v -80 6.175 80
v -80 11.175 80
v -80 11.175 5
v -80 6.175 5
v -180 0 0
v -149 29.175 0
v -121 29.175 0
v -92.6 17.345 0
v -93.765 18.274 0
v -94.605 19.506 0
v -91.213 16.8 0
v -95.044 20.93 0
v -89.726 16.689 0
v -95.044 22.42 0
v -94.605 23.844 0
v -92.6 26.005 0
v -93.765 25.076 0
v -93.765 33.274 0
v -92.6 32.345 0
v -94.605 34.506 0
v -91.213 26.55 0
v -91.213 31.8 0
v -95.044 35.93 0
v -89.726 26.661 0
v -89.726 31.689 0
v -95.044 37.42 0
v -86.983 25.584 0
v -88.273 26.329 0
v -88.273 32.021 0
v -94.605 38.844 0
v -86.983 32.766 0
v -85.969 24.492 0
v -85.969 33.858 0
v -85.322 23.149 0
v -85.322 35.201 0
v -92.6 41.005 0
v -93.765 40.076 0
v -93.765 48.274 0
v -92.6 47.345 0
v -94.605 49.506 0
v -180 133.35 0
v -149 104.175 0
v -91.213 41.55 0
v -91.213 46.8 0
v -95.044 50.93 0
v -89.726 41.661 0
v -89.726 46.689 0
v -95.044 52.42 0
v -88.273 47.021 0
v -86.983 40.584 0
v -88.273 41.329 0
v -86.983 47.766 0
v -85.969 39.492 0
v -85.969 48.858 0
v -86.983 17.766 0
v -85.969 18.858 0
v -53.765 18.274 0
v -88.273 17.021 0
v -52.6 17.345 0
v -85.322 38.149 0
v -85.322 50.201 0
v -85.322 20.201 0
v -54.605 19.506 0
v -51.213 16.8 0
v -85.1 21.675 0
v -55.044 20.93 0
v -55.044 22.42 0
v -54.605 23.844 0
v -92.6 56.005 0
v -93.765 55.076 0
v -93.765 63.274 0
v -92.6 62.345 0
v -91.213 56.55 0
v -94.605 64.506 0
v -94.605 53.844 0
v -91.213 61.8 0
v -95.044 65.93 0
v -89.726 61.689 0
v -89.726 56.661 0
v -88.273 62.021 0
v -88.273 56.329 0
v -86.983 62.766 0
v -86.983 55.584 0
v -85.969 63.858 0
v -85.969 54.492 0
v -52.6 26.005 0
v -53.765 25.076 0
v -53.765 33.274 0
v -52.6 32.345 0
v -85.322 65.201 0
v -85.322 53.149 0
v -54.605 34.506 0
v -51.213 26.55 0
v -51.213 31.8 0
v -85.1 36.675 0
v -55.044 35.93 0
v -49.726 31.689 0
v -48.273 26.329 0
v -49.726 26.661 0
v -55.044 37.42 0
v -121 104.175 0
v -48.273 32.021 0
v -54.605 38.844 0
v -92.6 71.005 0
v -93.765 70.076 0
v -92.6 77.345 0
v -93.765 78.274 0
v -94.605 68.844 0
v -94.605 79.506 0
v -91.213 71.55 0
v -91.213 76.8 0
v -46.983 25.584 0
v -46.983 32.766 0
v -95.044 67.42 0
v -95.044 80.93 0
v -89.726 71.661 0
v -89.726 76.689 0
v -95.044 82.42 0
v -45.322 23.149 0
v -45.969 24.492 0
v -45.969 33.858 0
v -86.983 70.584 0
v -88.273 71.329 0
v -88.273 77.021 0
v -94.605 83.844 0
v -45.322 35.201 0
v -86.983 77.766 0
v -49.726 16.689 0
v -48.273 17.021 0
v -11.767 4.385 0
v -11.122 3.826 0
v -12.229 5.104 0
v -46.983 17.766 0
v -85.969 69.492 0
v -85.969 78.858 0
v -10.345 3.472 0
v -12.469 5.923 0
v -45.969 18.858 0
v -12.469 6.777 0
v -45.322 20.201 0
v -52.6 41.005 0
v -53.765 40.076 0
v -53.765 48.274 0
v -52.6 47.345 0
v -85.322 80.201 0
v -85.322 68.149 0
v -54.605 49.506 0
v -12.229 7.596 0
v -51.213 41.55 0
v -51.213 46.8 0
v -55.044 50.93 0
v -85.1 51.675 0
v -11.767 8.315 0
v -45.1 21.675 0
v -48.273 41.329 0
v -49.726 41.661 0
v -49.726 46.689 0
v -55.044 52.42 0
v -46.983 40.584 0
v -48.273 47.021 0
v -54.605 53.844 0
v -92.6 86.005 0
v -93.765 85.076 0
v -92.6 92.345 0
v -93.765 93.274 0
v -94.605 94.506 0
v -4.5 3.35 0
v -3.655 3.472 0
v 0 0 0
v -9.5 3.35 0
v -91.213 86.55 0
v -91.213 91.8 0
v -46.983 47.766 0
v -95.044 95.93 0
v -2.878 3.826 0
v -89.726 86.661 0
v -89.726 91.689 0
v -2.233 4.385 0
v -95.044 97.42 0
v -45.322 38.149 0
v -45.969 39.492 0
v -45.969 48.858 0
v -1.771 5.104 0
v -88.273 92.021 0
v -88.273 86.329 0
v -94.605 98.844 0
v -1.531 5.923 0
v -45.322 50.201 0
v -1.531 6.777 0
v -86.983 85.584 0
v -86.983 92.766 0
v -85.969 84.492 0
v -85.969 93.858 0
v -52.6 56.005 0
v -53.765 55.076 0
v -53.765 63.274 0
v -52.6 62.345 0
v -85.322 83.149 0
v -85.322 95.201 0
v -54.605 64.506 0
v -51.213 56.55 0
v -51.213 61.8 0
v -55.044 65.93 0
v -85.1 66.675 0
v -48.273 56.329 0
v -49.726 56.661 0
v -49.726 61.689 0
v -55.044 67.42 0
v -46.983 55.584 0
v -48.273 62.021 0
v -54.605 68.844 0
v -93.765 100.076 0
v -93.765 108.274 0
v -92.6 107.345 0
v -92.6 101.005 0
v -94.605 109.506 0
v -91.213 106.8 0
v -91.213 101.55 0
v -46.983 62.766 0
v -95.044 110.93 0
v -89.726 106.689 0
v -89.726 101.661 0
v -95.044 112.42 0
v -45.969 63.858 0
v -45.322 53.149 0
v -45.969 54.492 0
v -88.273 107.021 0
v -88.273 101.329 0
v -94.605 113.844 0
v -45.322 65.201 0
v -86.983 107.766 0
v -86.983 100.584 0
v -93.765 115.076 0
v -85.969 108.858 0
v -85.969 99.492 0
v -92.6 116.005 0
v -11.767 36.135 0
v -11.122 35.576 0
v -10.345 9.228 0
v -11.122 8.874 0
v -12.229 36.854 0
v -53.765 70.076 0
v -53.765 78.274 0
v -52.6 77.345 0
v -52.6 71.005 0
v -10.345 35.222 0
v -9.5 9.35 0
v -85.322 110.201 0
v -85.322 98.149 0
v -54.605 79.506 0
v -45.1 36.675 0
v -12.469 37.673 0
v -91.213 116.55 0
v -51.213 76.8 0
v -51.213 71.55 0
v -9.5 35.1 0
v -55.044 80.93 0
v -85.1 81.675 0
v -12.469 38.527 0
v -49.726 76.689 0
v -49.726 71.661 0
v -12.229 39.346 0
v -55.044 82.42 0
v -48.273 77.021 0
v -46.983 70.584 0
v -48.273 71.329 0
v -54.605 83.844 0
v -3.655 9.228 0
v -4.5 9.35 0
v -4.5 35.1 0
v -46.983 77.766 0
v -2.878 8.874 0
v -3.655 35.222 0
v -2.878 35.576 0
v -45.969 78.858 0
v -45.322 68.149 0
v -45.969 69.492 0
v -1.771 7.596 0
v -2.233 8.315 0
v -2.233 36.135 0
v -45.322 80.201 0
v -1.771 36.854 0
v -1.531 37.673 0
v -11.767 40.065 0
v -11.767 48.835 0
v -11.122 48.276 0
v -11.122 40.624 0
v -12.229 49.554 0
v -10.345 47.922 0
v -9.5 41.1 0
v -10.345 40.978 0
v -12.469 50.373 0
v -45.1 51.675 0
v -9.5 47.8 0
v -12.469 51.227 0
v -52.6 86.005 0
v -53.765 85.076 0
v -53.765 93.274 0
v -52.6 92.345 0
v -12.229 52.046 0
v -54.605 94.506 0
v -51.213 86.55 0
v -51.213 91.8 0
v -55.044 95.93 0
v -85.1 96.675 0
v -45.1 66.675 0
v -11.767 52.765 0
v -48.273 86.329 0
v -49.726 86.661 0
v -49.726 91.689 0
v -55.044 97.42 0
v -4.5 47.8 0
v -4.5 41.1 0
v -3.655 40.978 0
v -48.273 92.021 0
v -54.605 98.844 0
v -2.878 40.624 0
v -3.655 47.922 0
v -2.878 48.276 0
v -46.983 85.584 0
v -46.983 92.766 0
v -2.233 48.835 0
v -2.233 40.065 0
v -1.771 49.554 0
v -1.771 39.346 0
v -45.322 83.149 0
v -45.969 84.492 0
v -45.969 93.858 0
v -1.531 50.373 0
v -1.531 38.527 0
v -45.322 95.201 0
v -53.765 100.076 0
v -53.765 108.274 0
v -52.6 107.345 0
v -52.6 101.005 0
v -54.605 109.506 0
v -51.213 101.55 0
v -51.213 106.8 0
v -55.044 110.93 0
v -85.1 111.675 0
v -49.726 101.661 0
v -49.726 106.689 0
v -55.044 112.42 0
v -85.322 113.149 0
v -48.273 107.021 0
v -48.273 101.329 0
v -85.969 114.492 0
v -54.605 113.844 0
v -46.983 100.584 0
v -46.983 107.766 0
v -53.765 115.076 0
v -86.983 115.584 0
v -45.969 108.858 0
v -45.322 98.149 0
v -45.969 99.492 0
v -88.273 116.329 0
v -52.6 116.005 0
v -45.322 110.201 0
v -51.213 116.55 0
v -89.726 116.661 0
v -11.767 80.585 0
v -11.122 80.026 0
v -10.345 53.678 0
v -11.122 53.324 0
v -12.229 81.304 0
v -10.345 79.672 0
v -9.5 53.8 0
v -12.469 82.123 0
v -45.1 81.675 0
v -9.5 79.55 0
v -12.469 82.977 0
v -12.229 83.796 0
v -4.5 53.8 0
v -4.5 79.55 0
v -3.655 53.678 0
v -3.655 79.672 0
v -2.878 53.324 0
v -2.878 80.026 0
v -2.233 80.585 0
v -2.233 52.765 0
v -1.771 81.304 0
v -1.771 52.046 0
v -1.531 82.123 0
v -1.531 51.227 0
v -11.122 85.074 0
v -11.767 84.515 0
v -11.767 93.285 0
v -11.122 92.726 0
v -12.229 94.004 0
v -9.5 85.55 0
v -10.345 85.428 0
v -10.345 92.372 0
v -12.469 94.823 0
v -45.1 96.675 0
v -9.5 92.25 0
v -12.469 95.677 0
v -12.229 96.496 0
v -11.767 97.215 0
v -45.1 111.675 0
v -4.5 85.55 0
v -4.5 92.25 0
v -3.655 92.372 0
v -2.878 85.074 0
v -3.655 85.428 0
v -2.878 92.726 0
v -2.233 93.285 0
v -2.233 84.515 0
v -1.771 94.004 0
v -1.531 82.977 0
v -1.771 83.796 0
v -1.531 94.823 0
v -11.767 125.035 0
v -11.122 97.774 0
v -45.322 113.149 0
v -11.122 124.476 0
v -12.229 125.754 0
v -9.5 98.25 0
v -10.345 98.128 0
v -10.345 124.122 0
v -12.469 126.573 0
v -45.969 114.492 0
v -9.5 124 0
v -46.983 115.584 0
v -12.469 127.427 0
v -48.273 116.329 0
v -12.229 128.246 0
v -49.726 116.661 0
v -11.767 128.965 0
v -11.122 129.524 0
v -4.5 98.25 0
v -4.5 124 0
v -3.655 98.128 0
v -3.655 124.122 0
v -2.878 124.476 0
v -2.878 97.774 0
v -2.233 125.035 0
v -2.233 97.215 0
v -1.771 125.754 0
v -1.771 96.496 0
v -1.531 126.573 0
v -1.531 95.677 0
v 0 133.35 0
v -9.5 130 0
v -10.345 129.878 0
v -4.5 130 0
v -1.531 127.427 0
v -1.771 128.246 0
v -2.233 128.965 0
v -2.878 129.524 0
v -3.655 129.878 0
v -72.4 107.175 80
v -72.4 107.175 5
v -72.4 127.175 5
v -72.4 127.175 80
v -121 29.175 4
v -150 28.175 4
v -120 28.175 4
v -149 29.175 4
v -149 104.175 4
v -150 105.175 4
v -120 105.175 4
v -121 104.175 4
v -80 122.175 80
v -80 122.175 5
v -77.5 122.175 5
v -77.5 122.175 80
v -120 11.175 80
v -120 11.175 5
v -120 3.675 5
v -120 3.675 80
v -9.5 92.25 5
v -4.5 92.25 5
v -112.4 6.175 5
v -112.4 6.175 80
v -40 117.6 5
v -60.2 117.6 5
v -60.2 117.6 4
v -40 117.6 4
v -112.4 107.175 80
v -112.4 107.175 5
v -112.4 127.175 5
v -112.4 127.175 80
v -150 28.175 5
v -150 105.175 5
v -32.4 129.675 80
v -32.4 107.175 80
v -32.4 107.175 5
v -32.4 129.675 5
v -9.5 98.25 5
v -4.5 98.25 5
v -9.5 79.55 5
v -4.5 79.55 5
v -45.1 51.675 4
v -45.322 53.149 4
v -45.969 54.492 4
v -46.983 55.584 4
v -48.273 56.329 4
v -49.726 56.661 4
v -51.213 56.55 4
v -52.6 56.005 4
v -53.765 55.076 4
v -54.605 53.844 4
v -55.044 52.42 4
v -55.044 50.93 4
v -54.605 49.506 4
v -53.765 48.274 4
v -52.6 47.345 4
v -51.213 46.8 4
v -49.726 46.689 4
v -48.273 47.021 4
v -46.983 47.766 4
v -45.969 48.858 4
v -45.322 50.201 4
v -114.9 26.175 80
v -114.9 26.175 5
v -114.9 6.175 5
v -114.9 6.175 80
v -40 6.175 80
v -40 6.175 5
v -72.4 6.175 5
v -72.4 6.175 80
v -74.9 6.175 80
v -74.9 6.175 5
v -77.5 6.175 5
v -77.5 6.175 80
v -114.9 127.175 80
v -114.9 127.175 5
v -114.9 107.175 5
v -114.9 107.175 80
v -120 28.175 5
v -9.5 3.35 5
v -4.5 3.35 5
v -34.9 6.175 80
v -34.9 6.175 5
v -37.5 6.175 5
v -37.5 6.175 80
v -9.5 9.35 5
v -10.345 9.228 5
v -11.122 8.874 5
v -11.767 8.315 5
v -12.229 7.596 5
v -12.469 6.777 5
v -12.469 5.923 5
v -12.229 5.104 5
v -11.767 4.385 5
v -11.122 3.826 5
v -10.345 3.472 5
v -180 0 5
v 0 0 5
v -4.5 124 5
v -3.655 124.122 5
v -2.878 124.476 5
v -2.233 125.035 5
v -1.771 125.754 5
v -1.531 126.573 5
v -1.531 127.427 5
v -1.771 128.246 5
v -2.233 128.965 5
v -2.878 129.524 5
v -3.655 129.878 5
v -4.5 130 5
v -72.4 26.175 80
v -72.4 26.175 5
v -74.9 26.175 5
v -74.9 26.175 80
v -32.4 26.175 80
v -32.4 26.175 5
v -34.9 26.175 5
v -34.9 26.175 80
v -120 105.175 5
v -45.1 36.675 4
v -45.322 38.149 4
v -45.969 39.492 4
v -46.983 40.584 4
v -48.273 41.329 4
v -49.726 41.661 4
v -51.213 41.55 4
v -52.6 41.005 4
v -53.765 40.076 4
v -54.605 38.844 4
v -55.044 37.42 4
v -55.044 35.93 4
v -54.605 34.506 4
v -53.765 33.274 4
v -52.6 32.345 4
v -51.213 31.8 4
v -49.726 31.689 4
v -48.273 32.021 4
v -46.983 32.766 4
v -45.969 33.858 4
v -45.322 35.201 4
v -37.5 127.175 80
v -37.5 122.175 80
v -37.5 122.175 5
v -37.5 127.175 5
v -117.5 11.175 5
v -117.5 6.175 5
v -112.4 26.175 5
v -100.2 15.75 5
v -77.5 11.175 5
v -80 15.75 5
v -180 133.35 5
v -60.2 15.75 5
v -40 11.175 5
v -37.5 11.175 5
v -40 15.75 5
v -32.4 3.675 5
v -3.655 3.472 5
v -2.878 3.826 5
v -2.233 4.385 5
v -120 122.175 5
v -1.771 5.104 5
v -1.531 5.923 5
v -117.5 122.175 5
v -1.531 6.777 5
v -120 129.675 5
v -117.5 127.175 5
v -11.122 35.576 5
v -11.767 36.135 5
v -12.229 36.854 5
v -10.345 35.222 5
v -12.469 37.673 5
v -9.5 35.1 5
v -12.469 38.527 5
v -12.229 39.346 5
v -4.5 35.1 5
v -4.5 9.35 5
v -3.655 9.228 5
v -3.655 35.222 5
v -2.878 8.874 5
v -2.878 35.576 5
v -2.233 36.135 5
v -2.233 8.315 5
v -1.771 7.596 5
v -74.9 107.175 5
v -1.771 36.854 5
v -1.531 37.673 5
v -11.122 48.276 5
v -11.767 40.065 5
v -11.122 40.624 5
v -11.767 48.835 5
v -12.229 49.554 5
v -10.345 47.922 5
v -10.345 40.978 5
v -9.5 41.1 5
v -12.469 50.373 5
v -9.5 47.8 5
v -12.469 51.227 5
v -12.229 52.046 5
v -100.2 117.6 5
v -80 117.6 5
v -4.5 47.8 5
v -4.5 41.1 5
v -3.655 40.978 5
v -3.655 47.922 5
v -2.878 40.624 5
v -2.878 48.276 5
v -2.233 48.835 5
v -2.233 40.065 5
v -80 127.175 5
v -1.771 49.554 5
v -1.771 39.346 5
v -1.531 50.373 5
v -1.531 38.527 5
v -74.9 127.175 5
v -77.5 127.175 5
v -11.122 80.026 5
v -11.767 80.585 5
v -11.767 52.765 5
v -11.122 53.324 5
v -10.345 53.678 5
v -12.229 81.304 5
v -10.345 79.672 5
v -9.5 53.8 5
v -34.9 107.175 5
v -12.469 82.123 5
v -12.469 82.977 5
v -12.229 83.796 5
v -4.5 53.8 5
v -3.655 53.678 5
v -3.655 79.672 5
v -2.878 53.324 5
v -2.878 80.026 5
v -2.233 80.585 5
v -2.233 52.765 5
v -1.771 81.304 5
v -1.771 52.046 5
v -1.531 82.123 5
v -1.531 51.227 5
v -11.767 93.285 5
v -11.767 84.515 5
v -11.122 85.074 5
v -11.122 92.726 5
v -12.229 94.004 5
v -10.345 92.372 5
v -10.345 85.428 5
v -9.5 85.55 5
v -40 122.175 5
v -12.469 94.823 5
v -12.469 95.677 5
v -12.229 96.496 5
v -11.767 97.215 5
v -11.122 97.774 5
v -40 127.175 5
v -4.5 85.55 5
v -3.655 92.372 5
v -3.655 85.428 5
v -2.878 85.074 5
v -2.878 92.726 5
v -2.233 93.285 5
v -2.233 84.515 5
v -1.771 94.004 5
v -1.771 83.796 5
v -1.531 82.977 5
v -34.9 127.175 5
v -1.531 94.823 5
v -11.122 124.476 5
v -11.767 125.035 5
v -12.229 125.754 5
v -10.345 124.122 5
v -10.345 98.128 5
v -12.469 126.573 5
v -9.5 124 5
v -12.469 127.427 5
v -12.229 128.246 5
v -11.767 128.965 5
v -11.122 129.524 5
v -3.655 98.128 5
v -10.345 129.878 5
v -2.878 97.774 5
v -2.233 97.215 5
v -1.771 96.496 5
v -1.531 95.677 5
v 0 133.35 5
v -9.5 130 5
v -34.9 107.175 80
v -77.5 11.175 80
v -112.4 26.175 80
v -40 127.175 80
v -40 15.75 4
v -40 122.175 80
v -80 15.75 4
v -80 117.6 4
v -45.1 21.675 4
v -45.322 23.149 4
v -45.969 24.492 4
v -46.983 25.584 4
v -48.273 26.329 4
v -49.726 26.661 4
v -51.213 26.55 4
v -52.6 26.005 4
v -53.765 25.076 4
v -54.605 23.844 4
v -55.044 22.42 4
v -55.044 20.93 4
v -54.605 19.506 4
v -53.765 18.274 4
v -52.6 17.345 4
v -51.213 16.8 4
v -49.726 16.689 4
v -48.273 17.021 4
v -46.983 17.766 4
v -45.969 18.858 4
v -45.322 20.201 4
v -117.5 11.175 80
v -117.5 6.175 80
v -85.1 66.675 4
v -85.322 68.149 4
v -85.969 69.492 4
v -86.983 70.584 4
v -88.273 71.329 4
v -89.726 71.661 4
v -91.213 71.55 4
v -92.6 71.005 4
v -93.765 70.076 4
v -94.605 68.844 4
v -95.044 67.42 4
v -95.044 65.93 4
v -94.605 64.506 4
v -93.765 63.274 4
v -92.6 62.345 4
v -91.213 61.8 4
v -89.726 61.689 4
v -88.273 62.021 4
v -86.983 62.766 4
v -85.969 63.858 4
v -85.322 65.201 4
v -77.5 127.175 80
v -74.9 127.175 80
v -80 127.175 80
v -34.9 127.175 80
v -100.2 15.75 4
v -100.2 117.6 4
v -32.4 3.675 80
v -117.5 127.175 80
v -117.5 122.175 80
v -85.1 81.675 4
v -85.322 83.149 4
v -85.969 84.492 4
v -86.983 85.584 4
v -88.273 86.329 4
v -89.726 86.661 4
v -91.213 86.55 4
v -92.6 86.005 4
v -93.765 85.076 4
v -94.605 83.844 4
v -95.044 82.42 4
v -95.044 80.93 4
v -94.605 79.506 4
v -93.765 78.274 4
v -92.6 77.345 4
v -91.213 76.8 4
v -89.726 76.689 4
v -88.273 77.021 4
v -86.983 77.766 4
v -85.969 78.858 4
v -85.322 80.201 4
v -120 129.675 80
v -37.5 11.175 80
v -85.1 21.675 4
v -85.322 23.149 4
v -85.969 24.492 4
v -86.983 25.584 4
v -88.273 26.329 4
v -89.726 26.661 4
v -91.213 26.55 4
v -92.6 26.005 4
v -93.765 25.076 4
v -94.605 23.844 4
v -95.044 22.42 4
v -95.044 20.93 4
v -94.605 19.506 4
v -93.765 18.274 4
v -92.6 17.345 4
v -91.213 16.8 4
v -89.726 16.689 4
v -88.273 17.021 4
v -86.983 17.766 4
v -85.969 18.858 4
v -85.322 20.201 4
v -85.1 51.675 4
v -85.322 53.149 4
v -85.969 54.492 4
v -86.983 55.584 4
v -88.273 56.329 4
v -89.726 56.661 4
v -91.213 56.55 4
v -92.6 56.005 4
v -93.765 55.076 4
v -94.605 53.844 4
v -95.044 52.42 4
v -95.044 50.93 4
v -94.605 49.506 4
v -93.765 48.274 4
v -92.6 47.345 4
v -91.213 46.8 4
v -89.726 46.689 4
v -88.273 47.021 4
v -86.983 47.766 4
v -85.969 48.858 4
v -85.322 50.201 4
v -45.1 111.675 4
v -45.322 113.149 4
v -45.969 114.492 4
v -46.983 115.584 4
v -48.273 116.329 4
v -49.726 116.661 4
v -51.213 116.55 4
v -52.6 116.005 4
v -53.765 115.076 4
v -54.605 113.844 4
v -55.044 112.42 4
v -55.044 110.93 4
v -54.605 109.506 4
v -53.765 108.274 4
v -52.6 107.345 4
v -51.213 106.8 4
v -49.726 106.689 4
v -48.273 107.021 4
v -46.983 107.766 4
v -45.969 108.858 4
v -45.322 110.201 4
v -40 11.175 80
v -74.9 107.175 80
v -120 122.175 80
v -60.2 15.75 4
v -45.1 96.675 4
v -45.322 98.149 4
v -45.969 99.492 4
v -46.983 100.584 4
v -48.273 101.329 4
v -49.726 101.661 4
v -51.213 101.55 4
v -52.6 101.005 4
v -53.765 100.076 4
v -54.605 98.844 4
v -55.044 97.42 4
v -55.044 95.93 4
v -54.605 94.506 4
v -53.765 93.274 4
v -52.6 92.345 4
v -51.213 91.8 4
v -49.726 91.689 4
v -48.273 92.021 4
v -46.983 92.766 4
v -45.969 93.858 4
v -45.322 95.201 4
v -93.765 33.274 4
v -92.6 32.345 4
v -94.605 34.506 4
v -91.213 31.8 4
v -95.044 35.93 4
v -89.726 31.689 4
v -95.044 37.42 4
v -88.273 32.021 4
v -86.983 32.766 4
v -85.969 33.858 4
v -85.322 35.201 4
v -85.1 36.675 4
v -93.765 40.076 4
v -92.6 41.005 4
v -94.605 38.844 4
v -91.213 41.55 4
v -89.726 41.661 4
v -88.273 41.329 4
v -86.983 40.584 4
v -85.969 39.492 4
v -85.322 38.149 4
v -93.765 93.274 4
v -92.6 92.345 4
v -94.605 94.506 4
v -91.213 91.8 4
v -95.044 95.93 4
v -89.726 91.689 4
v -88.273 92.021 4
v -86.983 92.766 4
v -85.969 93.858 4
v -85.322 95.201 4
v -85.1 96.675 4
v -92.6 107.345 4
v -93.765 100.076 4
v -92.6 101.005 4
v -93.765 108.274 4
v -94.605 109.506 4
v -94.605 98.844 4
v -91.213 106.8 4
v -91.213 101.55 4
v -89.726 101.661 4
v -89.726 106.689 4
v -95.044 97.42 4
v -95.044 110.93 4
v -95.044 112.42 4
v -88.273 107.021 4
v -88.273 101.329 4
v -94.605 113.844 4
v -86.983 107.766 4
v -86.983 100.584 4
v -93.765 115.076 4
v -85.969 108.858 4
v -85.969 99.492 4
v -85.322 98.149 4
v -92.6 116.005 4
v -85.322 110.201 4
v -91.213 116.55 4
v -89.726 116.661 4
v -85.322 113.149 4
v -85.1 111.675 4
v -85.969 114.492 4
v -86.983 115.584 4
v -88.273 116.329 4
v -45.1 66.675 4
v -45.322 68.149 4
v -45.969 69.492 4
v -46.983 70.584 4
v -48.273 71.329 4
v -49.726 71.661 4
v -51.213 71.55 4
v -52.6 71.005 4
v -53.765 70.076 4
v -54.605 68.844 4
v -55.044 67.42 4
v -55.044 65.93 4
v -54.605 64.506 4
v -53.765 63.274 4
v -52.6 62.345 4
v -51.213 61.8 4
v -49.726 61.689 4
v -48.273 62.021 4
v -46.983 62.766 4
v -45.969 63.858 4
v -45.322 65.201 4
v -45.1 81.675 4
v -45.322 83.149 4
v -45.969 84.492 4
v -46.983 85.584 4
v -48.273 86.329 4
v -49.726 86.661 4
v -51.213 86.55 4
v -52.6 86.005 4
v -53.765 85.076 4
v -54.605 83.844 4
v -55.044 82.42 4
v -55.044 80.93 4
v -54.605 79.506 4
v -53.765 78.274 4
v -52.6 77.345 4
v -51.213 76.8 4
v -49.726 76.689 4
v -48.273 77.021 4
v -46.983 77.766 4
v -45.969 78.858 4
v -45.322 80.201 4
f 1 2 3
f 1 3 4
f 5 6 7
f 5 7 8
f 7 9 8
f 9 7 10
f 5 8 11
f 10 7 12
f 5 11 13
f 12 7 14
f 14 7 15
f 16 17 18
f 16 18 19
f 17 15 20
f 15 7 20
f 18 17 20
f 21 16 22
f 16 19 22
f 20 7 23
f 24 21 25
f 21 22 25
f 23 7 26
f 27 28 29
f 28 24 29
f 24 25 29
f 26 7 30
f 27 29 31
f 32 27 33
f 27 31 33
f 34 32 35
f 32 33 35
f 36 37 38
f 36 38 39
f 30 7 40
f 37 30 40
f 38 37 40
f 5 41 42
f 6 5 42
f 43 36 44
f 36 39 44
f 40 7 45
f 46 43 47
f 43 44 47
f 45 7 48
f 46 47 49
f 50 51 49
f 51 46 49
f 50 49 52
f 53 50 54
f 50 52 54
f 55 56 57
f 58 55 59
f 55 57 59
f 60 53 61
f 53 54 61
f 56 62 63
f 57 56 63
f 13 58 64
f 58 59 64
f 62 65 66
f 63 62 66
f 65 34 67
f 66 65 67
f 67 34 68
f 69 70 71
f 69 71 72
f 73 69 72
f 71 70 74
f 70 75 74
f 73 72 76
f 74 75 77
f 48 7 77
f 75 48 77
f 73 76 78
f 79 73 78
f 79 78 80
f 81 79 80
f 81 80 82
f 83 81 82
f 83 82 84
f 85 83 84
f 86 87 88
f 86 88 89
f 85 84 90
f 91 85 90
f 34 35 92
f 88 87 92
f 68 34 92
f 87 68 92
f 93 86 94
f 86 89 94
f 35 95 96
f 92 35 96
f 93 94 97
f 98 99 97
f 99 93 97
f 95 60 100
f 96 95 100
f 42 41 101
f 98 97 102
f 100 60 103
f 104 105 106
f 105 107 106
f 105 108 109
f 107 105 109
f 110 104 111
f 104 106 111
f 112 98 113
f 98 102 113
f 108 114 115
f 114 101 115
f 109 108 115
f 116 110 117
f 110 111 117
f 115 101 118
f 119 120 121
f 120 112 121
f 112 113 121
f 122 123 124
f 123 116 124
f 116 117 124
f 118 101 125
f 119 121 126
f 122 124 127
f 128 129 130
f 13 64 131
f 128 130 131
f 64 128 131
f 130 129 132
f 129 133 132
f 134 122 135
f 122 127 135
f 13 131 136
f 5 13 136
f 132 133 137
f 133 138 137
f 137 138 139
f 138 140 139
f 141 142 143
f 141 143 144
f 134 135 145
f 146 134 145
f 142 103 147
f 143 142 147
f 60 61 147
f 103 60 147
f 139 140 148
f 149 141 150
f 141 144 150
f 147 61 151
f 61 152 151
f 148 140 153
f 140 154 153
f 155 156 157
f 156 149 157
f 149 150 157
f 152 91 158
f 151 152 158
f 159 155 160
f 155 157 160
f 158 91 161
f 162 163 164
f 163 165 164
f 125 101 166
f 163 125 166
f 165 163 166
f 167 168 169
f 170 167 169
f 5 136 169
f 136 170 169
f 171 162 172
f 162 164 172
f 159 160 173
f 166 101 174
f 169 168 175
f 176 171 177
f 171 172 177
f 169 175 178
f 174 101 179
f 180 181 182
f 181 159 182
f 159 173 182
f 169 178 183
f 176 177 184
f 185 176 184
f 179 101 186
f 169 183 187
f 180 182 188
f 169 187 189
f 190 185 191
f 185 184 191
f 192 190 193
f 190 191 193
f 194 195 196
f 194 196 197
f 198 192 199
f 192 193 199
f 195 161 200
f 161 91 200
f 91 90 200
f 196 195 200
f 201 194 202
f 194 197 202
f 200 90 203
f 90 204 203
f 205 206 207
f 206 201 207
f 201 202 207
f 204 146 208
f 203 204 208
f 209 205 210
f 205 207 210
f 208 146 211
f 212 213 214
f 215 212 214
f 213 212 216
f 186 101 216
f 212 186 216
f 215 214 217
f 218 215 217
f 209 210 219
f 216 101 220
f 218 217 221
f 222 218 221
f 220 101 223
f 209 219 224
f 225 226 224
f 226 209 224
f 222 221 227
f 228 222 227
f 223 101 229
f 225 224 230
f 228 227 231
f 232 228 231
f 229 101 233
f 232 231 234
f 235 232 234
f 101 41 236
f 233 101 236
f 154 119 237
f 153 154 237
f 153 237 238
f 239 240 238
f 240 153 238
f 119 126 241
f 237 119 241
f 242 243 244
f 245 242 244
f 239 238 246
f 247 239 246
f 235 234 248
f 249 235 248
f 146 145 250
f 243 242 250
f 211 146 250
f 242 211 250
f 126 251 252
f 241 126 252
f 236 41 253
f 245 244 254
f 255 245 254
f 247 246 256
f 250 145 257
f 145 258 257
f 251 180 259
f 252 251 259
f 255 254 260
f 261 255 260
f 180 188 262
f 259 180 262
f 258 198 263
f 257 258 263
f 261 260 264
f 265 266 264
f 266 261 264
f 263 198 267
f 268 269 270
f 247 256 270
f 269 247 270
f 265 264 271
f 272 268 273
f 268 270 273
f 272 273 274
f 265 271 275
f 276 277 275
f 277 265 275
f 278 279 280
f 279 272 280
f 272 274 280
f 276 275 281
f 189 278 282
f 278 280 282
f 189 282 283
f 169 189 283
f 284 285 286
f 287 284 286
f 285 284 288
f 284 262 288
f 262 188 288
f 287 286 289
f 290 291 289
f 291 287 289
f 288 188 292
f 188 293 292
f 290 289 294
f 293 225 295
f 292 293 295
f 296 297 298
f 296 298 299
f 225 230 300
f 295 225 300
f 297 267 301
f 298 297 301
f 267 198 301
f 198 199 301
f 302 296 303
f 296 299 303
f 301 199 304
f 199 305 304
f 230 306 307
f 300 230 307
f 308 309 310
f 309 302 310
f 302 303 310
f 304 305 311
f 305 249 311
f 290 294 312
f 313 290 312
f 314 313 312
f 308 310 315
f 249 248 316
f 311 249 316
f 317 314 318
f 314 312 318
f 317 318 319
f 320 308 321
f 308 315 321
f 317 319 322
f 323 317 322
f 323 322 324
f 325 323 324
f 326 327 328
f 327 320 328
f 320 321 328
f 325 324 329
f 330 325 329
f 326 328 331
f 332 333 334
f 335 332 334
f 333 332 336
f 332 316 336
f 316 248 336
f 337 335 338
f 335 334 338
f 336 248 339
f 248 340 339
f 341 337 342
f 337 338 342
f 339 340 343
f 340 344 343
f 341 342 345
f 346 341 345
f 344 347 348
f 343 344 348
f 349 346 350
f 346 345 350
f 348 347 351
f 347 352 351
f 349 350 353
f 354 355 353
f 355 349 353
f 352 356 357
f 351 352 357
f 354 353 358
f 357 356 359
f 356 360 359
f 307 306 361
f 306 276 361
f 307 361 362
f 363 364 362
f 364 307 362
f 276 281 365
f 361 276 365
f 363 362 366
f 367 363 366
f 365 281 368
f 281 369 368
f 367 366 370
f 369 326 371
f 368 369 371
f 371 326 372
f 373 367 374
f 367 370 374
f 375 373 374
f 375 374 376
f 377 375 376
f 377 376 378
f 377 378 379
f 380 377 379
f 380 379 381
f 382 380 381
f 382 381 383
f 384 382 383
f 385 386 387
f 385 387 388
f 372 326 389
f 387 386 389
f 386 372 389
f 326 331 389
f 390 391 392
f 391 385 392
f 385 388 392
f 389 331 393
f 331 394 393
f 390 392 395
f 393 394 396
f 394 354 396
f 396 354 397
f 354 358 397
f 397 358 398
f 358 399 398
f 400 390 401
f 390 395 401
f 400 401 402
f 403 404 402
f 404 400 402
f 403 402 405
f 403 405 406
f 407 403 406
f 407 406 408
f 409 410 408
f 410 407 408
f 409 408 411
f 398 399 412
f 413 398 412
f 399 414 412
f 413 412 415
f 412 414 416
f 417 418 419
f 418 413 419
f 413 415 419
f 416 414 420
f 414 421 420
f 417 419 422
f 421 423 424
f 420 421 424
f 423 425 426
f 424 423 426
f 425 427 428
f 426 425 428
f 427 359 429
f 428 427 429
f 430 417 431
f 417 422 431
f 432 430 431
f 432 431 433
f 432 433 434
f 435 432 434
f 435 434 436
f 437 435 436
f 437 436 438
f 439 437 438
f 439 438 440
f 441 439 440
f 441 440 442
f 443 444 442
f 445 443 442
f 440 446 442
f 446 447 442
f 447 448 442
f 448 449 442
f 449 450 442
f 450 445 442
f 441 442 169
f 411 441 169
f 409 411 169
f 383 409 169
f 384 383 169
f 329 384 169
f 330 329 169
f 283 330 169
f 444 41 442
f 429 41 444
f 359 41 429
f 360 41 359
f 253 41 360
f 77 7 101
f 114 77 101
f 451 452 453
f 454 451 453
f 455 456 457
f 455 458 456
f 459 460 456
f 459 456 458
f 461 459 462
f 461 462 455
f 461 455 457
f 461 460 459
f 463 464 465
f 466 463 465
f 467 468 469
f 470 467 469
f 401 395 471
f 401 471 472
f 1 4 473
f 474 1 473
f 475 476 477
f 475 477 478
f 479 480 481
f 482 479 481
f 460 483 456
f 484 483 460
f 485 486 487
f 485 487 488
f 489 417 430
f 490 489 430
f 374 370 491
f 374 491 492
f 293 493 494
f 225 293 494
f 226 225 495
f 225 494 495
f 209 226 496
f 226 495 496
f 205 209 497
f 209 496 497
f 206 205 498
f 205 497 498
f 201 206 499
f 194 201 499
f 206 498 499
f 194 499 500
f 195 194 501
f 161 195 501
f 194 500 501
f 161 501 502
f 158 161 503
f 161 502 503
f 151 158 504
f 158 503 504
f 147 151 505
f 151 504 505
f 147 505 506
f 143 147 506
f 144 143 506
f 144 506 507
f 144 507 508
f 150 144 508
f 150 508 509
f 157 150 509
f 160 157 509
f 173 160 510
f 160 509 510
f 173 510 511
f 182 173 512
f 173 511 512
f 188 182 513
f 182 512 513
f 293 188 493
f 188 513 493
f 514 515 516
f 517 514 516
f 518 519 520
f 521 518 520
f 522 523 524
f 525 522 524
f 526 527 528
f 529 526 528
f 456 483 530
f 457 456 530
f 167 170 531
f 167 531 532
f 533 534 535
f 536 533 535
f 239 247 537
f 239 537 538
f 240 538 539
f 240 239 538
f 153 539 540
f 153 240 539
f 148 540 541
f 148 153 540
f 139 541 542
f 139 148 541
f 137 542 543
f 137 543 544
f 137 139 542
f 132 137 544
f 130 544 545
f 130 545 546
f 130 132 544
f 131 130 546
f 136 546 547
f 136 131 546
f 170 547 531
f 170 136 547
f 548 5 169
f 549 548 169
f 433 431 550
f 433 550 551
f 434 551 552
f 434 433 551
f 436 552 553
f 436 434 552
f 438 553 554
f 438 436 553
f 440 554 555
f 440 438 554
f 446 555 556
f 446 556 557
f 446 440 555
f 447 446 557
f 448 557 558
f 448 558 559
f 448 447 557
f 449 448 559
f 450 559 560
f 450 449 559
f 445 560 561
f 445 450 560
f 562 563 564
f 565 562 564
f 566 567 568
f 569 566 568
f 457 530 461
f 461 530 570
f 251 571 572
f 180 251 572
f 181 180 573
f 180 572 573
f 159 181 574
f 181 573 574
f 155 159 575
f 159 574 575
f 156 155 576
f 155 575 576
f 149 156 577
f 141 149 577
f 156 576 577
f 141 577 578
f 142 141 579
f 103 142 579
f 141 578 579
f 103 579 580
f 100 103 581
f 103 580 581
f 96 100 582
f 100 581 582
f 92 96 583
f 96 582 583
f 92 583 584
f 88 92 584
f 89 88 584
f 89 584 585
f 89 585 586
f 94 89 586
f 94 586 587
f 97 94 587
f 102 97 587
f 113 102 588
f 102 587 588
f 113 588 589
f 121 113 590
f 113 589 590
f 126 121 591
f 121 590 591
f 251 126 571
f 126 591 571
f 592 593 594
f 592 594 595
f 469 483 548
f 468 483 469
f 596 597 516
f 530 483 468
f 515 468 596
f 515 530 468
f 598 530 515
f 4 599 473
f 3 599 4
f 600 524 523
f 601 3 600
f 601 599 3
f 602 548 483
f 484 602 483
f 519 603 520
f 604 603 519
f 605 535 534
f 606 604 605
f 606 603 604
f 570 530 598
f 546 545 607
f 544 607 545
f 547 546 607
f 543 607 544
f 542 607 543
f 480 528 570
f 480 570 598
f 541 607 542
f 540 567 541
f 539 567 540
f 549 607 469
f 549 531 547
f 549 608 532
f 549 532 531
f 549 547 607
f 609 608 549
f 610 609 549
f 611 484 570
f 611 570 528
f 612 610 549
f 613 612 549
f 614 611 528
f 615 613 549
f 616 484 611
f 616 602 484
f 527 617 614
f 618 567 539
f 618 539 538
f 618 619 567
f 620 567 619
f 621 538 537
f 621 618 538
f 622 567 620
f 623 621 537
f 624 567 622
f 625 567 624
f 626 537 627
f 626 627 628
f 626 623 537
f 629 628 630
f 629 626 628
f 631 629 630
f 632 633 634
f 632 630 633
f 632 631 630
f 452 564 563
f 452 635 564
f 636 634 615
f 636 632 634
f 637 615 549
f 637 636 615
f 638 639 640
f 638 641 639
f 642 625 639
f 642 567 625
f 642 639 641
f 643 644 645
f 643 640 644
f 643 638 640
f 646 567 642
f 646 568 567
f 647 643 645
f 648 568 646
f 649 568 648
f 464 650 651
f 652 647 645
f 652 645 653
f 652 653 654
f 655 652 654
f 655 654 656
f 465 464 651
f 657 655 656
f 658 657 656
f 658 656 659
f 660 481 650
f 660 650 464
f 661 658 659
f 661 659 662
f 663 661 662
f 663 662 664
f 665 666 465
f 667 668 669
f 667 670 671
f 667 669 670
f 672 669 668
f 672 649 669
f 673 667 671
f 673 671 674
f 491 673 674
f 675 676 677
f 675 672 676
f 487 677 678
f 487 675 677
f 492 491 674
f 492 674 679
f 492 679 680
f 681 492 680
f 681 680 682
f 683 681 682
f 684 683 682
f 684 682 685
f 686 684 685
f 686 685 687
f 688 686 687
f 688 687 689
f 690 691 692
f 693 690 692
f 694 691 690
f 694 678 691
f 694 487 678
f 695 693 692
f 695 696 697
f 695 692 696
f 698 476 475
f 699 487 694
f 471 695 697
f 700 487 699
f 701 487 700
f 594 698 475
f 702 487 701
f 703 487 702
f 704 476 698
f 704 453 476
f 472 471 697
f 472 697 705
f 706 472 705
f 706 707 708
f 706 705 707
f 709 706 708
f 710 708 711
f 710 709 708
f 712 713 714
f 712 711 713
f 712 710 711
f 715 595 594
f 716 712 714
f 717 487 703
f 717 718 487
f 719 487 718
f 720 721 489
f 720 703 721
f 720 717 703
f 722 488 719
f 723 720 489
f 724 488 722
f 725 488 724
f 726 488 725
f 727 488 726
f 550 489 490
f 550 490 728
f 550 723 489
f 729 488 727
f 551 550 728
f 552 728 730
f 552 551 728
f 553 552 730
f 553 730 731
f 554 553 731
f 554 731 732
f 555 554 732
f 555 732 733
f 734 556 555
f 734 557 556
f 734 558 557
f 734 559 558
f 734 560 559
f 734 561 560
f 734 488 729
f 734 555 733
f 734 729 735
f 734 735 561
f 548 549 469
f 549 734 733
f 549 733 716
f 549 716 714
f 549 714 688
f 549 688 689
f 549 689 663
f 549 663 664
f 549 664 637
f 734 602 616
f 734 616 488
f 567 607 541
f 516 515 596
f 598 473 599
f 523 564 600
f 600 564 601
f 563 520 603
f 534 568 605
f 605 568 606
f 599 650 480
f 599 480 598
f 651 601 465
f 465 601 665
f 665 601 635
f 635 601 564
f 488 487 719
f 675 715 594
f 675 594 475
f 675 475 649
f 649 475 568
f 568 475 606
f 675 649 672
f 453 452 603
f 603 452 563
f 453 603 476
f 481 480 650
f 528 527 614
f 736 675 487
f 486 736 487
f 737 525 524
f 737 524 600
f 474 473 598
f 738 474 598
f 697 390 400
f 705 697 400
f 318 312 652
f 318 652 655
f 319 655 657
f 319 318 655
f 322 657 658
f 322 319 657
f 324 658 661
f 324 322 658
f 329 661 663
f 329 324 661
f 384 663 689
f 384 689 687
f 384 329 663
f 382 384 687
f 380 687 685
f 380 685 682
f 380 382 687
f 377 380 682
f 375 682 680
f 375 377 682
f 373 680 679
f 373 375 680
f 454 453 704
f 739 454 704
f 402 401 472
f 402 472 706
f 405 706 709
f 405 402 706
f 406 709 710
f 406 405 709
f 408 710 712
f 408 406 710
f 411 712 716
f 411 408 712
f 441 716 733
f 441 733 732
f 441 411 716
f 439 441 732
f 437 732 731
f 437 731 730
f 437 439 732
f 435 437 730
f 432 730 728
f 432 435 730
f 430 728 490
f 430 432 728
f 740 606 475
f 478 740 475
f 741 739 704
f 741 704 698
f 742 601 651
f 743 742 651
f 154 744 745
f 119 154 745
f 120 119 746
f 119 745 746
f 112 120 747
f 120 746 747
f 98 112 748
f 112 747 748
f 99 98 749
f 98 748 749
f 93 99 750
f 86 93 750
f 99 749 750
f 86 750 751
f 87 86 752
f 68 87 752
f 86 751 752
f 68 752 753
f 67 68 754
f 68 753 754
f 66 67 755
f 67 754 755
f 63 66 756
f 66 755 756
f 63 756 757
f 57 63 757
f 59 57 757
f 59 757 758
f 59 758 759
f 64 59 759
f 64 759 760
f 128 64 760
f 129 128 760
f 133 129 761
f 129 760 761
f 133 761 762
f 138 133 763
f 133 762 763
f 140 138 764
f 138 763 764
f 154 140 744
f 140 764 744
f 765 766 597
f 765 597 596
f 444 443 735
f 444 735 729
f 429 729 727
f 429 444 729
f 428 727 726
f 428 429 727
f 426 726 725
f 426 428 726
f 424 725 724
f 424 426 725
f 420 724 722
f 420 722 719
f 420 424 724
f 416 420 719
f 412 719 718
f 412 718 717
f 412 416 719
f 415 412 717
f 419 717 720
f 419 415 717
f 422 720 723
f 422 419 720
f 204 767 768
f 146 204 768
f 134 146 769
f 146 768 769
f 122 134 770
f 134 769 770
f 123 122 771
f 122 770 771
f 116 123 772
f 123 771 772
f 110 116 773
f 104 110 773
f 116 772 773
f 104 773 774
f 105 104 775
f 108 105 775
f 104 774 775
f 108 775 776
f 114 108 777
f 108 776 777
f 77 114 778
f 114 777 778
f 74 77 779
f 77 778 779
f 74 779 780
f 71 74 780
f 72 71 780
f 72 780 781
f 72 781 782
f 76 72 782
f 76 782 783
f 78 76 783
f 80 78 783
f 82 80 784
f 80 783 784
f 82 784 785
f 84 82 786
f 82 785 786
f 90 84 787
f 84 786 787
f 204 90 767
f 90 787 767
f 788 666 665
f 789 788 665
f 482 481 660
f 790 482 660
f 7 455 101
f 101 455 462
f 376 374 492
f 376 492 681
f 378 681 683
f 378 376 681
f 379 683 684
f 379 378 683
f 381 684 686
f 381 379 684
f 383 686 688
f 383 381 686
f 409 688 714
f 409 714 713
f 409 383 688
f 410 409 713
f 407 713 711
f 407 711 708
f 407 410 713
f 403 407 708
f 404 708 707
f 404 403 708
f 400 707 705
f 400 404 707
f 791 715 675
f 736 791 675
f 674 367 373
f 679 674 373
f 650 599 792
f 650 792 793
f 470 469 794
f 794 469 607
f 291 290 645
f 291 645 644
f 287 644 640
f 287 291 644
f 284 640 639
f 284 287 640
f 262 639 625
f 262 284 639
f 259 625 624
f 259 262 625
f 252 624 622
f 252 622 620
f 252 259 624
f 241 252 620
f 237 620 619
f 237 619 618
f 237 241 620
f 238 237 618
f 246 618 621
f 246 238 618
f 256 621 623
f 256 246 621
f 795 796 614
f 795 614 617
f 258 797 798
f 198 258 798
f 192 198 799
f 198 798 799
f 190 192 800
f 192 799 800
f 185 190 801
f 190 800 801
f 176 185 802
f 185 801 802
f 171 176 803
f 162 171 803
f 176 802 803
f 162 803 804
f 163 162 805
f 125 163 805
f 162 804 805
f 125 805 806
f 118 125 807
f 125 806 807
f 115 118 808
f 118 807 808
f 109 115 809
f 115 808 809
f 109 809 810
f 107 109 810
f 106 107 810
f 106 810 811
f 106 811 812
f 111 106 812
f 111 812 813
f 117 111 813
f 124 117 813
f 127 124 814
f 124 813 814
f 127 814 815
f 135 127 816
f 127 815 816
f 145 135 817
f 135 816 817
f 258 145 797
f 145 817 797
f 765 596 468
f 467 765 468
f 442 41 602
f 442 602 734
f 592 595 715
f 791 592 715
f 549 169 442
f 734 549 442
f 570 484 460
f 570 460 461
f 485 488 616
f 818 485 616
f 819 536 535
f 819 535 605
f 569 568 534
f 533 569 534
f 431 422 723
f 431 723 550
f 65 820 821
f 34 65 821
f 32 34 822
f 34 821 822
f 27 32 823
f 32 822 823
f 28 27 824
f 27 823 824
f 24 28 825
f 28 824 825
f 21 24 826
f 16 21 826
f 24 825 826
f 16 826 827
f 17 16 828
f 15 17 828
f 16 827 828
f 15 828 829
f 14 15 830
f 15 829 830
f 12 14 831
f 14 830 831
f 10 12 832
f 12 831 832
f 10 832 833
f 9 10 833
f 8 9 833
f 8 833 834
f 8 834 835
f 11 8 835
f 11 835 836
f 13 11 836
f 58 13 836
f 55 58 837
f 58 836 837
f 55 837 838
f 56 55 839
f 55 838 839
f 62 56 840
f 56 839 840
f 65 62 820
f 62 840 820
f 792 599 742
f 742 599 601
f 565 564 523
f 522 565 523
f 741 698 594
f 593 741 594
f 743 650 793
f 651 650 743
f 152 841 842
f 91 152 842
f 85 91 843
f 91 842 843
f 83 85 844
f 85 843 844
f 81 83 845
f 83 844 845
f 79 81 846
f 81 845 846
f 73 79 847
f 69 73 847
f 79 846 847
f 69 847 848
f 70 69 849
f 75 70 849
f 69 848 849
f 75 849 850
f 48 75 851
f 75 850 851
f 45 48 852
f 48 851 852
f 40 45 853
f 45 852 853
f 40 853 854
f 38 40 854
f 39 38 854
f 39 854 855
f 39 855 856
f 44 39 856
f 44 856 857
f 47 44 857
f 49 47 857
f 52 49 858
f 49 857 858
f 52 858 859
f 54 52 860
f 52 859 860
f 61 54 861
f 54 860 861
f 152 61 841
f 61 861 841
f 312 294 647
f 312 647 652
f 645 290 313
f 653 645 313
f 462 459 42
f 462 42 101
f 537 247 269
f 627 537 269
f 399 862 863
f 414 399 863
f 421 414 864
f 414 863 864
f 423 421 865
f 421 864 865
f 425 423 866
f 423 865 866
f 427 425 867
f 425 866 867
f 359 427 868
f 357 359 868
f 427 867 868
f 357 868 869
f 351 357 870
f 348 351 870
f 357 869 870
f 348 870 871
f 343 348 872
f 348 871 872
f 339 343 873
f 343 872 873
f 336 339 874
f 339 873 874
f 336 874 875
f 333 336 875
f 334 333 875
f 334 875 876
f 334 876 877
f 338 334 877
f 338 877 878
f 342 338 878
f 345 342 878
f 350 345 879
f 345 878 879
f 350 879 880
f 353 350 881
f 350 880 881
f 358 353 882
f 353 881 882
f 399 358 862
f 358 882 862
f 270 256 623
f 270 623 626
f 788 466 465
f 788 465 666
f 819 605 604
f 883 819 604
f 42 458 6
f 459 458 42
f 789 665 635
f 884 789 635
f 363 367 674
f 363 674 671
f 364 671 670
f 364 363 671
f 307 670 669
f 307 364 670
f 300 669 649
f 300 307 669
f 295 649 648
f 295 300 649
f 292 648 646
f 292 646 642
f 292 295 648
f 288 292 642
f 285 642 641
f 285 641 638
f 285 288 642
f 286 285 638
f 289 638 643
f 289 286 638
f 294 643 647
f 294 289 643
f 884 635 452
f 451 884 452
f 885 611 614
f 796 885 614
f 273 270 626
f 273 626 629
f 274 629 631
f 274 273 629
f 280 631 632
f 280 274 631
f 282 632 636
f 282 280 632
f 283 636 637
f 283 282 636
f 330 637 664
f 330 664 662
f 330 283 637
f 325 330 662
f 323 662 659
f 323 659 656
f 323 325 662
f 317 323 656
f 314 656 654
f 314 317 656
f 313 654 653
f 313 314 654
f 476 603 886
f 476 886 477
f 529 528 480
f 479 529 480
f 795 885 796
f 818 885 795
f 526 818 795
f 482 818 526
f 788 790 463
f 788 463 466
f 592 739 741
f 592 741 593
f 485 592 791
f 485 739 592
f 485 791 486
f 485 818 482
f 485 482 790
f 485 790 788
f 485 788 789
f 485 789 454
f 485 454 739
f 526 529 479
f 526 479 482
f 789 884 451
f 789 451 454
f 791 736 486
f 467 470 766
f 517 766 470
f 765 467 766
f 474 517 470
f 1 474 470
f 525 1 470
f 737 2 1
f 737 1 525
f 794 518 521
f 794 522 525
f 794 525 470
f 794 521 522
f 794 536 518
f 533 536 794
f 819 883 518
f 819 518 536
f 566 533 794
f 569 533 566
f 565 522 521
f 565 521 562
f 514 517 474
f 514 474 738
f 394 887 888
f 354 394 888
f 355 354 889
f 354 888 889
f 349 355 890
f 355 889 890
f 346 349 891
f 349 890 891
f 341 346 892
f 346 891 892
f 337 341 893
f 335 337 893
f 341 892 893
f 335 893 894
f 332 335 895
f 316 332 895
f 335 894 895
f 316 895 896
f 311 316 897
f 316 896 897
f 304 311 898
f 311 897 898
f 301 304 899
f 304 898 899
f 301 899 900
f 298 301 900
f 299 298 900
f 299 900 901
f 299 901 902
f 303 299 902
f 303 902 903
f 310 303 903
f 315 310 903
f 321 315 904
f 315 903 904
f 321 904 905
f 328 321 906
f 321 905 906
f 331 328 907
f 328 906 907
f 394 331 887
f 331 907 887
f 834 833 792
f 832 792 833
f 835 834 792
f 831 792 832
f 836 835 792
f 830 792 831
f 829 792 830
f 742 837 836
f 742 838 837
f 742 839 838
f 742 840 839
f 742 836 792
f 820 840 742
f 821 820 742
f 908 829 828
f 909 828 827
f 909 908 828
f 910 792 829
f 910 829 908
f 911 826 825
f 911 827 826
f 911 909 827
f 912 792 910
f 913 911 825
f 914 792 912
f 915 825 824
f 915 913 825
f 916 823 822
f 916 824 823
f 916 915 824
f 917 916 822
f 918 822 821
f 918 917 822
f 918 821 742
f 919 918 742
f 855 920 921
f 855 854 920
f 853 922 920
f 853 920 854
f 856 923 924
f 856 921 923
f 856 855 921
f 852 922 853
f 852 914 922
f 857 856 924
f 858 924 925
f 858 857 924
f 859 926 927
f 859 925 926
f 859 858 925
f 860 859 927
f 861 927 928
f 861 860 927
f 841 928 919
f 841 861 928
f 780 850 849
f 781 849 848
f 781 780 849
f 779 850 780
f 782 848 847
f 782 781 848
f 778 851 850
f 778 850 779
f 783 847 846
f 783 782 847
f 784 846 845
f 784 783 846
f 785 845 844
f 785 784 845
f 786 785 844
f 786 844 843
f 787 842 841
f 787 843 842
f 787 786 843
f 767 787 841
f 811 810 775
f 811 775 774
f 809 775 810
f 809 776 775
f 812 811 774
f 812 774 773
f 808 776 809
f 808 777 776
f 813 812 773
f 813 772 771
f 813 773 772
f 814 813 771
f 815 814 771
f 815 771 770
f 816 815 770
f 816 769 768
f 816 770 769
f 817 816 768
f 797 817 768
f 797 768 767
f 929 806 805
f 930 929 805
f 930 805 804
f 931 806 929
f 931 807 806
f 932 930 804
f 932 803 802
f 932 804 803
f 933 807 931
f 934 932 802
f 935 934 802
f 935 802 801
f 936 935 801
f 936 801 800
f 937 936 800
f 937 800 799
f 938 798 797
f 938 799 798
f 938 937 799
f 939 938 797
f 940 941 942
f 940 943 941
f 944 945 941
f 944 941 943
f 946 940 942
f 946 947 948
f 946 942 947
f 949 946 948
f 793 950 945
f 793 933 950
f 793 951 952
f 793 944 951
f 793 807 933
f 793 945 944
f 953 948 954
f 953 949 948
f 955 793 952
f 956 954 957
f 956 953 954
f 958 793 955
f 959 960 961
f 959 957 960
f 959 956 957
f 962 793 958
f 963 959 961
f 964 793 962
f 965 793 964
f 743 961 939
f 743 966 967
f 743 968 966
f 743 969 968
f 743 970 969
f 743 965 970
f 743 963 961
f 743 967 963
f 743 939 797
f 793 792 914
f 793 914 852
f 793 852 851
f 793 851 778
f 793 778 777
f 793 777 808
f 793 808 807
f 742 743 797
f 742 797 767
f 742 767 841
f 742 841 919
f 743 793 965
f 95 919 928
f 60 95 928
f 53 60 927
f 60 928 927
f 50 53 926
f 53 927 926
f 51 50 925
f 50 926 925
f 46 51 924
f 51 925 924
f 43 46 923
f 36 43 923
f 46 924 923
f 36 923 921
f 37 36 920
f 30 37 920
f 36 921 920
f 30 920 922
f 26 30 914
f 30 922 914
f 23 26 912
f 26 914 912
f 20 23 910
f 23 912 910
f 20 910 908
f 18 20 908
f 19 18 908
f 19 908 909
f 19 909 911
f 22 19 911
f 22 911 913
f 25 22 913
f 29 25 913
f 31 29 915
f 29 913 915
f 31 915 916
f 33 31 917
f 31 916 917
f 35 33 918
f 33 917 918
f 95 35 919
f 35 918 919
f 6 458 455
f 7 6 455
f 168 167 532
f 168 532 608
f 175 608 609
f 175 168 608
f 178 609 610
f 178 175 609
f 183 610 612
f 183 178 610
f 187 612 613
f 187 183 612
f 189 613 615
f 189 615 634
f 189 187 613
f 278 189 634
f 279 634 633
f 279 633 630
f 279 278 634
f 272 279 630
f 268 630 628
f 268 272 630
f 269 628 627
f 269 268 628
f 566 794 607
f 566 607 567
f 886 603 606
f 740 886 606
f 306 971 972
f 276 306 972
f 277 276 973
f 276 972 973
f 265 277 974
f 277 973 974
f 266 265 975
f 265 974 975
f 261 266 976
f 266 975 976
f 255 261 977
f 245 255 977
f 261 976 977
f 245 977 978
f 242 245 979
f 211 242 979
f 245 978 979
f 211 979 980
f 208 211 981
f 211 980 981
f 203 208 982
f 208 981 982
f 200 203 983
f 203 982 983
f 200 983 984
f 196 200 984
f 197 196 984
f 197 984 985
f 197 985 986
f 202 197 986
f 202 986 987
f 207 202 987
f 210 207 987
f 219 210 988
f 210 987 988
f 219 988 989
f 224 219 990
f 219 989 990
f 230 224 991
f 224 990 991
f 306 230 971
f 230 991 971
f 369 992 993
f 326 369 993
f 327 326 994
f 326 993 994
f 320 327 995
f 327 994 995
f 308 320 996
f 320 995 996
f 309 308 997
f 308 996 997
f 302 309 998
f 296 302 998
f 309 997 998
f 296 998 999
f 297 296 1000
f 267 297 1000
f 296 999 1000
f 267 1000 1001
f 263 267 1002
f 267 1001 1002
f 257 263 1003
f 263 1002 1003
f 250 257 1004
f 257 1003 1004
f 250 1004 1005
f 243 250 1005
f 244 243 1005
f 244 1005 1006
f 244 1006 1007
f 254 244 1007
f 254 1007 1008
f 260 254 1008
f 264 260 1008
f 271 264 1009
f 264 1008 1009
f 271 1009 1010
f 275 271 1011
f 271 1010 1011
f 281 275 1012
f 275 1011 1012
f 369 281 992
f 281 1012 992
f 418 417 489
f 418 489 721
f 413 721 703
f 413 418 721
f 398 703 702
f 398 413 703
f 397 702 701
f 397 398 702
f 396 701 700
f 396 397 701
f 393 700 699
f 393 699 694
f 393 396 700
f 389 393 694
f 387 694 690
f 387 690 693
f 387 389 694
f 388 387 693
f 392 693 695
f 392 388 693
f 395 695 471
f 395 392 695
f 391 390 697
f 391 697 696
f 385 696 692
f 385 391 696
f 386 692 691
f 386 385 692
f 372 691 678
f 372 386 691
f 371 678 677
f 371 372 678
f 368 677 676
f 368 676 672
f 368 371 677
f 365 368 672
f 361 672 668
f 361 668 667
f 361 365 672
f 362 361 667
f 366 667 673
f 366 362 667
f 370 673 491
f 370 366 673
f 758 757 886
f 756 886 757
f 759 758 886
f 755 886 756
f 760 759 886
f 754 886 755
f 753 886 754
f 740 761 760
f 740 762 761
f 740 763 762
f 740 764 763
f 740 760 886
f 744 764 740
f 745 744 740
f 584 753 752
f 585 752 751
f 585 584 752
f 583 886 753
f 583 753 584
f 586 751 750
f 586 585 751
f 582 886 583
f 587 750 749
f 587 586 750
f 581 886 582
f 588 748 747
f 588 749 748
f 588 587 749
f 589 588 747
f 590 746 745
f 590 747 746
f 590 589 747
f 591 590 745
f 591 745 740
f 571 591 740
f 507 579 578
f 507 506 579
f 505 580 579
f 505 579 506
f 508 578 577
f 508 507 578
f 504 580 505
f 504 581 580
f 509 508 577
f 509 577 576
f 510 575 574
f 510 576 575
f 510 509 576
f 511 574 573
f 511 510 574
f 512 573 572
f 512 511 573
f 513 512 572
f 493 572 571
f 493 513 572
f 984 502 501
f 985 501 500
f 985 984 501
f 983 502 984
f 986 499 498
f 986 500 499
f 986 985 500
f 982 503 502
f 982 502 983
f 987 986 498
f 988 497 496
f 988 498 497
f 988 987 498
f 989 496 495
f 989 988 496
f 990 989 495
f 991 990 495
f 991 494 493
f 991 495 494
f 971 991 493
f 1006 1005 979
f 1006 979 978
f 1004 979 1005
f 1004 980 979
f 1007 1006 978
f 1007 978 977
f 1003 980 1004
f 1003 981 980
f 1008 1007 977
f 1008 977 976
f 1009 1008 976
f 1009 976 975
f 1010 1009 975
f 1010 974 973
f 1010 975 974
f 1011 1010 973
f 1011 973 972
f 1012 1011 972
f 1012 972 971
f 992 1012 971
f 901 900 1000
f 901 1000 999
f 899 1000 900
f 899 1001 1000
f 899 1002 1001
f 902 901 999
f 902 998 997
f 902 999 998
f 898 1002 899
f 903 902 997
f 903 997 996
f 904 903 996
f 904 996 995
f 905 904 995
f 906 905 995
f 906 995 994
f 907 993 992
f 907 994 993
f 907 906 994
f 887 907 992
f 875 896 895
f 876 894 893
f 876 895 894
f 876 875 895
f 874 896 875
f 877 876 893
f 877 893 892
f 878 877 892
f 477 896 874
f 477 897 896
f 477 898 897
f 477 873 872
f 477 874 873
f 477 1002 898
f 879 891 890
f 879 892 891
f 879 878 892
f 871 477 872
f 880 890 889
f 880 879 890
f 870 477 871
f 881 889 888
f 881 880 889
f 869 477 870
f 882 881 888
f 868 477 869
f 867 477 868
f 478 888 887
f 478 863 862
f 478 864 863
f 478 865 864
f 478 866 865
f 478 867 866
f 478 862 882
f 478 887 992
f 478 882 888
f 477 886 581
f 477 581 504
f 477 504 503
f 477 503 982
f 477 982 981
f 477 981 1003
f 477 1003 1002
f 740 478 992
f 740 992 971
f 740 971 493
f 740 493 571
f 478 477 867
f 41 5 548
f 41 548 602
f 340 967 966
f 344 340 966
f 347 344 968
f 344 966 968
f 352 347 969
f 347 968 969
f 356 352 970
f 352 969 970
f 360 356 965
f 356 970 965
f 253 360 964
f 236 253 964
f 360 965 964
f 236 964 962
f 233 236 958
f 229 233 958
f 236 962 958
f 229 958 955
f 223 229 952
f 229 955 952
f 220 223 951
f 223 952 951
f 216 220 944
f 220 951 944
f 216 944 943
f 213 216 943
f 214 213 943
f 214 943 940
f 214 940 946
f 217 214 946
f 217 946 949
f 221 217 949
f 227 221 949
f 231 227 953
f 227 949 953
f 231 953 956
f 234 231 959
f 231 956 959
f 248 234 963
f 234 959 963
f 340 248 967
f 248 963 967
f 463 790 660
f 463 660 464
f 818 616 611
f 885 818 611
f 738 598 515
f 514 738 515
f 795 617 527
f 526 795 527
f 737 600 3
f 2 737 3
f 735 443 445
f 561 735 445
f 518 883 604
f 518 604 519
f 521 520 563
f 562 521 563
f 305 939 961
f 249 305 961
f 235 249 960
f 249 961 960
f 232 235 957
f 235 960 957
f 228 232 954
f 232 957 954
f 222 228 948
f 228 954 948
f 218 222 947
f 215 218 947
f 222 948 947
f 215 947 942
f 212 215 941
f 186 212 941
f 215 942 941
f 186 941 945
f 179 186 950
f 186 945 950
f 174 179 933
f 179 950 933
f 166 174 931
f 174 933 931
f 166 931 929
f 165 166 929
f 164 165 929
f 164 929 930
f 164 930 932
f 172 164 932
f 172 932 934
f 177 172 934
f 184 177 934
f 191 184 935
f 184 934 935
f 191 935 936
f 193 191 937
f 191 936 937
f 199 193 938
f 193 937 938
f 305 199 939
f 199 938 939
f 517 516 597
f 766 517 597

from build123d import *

# Parameters (mm, degrees)
SKETCH_W        = 180
SKETCH_H        = 133.35
PAD_DEPTH       = 5
SKETCH001_W     = 20.2
SKETCH001_H     = 101.85
SKETCH001_W_2   = 30
SKETCH001_H_2   = 77
POCKET_DEPTH    = 1
SKETCH002_W     = 28
SKETCH002_H     = 75
POCKET001_DEPTH = 4
SKETCH003_R     = 5
POCKET002_DEPTH = 4
SKETCH004_R     = 5
POCKET003_DEPTH = 4
PAD001_DEPTH    = 75


with BuildPart() as part:
    # Sketch (on XY_Plane of Origin) → Pad (new body)
    with BuildSketch(Plane.XY):
        with Locations((-90, 66.675)):
            Rectangle(SKETCH_W, SKETCH_H)
        with BuildLine():
            ThreePointArc((-9.5, 130), (-12.5, 127), (-9.5, 124))
            Line((-9.5, 124), (-4.5, 124))
            ThreePointArc((-4.5, 124), (-1.5, 127), (-4.5, 130))
            Line((-9.5, 130), (-4.5, 130))
        make_face(mode=Mode.SUBTRACT)
        with BuildLine():
            ThreePointArc((-9.5, 98.25), (-12.5, 95.25), (-9.5, 92.25))
            Line((-9.5, 92.25), (-4.5, 92.25))
            ThreePointArc((-4.5, 92.25), (-1.5, 95.25), (-4.5, 98.25))
            Line((-9.5, 98.25), (-4.5, 98.25))
        make_face(mode=Mode.SUBTRACT)
        with BuildLine():
            ThreePointArc((-9.5, 85.55), (-12.5, 82.55), (-9.5, 79.55))
            Line((-9.5, 79.55), (-4.5, 79.55))
            ThreePointArc((-4.5, 79.55), (-1.5, 82.55), (-4.5, 85.55))
            Line((-9.5, 85.55), (-4.5, 85.55))
        make_face(mode=Mode.SUBTRACT)
        with BuildLine():
            ThreePointArc((-9.5, 53.8), (-12.5, 50.8), (-9.5, 47.8))
            Line((-9.5, 47.8), (-4.5, 47.8))
            ThreePointArc((-4.5, 47.8), (-1.5, 50.8), (-4.5, 53.8))
            Line((-9.5, 53.8), (-4.5, 53.8))
        make_face(mode=Mode.SUBTRACT)
        with BuildLine():
            ThreePointArc((-9.5, 41.1), (-12.5, 38.1), (-9.5, 35.1))
            Line((-9.5, 35.1), (-4.5, 35.1))
            ThreePointArc((-4.5, 35.1), (-1.5, 38.1), (-4.5, 41.1))
            Line((-9.5, 41.1), (-4.5, 41.1))
        make_face(mode=Mode.SUBTRACT)
        with BuildLine():
            ThreePointArc((-9.5, 9.35), (-12.5, 6.35), (-9.5, 3.35))
            Line((-9.5, 3.35), (-4.5, 3.35))
            ThreePointArc((-4.5, 3.35), (-1.5, 6.35), (-4.5, 9.35))
            Line((-9.5, 9.35), (-4.5, 9.35))
        make_face(mode=Mode.SUBTRACT)
    extrude(amount=PAD_DEPTH)

    # Sketch001 (on Face30 of Pad) → Pocket (cut)
    with BuildSketch(Plane.XY.offset(5)):
        with Locations((-50.1, 66.675)):
            Rectangle(SKETCH001_W, SKETCH001_H)
        with Locations((-90.1, 66.675)):
            Rectangle(SKETCH001_W, SKETCH001_H)
        with Locations((-135, 66.675)):
            Rectangle(SKETCH001_W_2, SKETCH001_H_2)
    extrude(amount=-POCKET_DEPTH, mode=Mode.SUBTRACT)

    # Sketch002 (on Face43 of Pocket) → Pocket001 (cut)
    with BuildSketch(Plane.XY.offset(4)):
        with Locations((-135, 66.675)):
            Rectangle(SKETCH002_W, SKETCH002_H)
    extrude(amount=-POCKET001_DEPTH, mode=Mode.SUBTRACT)

    # Sketch003 (on Face48 of Pocket001) → Pocket002 (cut)
    with BuildSketch(Plane.XY.offset(4)):
        with Locations((-90.1, 66.675)):
            Circle(SKETCH003_R)
        with Locations((-90.1, 81.675)):
            Circle(SKETCH003_R)
        with Locations((-90.1, 96.675)):
            Circle(SKETCH003_R)
        with Locations((-90.1, 111.675)):
            Circle(SKETCH003_R)
        with Locations((-90.1, 51.675)):
            Circle(SKETCH003_R)
        with Locations((-90.1, 36.675)):
            Circle(SKETCH003_R)
        with Locations((-90.1, 21.675)):
            Circle(SKETCH003_R)
    extrude(amount=-POCKET002_DEPTH, mode=Mode.SUBTRACT)

    # Sketch004 (on Face56 of Pocket002) → Pocket003 (cut)
    with BuildSketch(Plane.XY.offset(4)):
        with Locations((-50.1, 66.675)):
            Circle(SKETCH004_R)
        with Locations((-50.1, 81.675)):
            Circle(SKETCH004_R)
        with Locations((-50.1, 96.675)):
            Circle(SKETCH004_R)
        with Locations((-50.1, 111.675)):
            Circle(SKETCH004_R)
        with Locations((-50.1, 51.675)):
            Circle(SKETCH004_R)
        with Locations((-50.1, 36.675)):
            Circle(SKETCH004_R)
        with Locations((-50.1, 21.675)):
            Circle(SKETCH004_R)
    extrude(amount=-POCKET003_DEPTH, mode=Mode.SUBTRACT)

    # Sketch005 (on Face5 of Pocket003) → Pad001 (join)
    with BuildSketch(Plane.XY.offset(5)):
        Polygon((-32.4, 129.675), (-120, 129.675), (-120, 122.175), (-117.5, 122.175), (-117.5, 127.175), (-114.9, 127.175), (-114.9, 107.175), (-112.4, 107.175), (-112.4, 127.175), (-80, 127.175), (-80, 122.175), (-77.5, 122.175), (-77.5, 127.175), (-74.9, 127.175), (-74.9, 107.175), (-72.4, 107.175), (-72.4, 127.175), (-40, 127.175), (-40, 122.175), (-37.5, 122.175), (-37.5, 127.175), (-34.9, 127.175), (-34.9, 107.175), (-32.4, 107.175), align=None)
        Polygon((-32.4, 3.675), (-32.4, 26.175), (-34.9, 26.175), (-34.9, 6.175), (-37.5, 6.175), (-37.5, 11.175), (-40, 11.175), (-40, 6.175), (-72.4, 6.175), (-72.4, 26.175), (-74.9, 26.175), (-74.9, 6.175), (-77.5, 6.175), (-77.5, 11.175), (-80, 11.175), (-80, 6.175), (-112.4, 6.175), (-112.4, 26.175), (-114.9, 26.175), (-114.9, 6.175), (-117.5, 6.175), (-117.5, 11.175), (-120, 11.175), (-120, 3.675), align=None)
    extrude(amount=PAD001_DEPTH)


solid = part.part
